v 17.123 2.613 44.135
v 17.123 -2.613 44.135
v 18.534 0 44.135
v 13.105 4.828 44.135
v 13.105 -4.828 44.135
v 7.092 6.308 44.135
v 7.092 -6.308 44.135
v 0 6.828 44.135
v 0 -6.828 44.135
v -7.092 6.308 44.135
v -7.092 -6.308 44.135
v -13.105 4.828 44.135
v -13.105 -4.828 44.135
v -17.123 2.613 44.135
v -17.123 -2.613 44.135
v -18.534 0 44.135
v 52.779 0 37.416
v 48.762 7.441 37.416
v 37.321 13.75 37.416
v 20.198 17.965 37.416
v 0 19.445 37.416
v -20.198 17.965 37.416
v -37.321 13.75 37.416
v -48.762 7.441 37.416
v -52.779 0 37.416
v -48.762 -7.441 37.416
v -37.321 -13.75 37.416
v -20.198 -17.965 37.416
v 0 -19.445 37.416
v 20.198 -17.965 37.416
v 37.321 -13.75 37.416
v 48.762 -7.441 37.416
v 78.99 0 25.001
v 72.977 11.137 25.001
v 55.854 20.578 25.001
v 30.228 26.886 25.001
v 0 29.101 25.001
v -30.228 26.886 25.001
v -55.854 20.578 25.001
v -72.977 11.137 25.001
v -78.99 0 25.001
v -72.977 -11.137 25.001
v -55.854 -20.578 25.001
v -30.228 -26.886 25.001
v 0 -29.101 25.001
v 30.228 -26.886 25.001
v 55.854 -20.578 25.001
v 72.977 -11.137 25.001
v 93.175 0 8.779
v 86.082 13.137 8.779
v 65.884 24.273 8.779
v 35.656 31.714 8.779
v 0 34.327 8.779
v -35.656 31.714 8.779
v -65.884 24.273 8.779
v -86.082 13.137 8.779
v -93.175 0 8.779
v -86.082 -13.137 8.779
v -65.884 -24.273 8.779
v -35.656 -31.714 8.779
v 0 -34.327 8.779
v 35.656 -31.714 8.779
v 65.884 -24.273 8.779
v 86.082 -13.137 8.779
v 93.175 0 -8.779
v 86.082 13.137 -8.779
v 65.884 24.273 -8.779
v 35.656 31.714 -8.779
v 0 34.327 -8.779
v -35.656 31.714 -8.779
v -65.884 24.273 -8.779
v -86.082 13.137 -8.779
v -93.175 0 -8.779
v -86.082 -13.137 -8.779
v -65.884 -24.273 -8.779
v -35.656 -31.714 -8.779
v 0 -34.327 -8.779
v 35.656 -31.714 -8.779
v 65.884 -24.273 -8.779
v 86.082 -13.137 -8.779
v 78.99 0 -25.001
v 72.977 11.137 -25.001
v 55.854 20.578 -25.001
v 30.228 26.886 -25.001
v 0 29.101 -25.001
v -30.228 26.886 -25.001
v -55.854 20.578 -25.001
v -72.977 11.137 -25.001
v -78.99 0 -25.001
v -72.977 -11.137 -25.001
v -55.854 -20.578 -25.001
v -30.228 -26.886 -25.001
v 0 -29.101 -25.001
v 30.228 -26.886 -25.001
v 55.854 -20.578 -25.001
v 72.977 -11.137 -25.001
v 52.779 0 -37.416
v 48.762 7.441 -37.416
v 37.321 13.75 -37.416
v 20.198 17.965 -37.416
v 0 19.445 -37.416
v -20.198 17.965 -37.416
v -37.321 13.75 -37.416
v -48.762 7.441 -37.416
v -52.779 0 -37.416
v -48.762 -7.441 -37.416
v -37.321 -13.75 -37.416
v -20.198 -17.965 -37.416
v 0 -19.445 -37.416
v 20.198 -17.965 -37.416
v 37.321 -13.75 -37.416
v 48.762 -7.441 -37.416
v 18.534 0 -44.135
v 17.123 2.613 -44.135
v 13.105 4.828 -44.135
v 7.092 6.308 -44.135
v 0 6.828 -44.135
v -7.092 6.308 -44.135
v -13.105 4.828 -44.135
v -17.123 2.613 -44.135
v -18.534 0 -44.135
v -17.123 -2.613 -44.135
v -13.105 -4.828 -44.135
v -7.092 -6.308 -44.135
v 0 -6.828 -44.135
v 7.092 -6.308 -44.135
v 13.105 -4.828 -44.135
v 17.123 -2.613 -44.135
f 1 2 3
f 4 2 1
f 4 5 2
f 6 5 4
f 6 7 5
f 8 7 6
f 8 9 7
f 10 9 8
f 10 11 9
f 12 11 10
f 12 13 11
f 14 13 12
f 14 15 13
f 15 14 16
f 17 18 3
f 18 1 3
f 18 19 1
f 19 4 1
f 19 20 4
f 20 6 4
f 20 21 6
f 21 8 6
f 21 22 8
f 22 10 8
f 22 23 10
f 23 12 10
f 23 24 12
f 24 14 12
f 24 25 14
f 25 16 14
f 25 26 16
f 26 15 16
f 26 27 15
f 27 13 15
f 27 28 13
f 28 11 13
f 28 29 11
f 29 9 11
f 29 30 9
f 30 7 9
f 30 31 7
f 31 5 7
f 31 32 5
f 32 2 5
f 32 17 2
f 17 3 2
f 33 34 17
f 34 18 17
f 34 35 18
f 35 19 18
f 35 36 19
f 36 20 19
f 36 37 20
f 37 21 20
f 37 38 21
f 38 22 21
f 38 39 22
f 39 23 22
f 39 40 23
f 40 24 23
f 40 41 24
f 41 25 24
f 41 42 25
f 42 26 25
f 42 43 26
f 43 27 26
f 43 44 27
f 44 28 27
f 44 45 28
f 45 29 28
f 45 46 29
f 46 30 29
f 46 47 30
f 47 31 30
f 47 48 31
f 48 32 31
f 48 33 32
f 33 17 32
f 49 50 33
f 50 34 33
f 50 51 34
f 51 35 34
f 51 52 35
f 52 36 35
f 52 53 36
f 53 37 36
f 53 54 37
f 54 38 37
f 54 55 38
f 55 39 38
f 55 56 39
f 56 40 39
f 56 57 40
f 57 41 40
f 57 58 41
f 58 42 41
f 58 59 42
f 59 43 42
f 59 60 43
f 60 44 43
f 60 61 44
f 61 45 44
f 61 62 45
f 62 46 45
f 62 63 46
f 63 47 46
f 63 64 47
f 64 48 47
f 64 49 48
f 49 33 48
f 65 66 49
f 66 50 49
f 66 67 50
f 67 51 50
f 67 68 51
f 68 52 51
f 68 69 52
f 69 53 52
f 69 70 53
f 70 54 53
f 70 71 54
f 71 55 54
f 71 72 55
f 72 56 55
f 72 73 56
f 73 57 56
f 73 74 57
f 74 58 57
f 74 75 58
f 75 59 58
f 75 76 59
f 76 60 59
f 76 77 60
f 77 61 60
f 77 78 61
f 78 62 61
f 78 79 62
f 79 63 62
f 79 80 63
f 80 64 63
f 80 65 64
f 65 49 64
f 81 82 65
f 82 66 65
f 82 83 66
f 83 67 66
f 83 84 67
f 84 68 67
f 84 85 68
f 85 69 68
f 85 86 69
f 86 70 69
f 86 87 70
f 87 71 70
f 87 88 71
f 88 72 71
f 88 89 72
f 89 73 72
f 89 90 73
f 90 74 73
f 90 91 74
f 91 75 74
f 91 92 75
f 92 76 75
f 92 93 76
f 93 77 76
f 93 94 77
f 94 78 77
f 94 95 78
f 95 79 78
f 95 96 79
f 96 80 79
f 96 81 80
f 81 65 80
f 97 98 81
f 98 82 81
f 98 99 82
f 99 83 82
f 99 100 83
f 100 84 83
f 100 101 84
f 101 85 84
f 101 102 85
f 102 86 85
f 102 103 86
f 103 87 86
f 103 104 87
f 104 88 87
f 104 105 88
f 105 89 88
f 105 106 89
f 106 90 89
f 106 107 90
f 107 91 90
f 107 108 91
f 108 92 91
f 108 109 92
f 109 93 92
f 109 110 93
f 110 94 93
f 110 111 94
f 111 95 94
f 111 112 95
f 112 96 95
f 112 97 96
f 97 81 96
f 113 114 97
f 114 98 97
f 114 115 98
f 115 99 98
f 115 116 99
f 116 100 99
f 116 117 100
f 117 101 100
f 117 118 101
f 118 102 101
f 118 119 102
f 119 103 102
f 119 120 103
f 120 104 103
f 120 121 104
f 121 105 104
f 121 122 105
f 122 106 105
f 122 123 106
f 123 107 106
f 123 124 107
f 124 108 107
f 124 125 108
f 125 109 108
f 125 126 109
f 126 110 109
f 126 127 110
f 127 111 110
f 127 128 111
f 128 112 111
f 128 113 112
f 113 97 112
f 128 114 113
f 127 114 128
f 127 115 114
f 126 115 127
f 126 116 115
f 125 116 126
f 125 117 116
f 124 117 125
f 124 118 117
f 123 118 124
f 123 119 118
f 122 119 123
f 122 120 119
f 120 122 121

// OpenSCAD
// Generated by SolidPython 1.0.1 on 2020-07-29 00:46:53


scale(v = [19, 7, 9]) {
	sphere(r = 5);
}
/***********************************************
*********      SolidPython code:      **********
************************************************
 
# import packages: SolidPython
from solid import *
from solid.utils import *
from itertools import chain, combinations, permutations


class Resize:

    def __init__(self, scad_file):
        self.scad_file = scad_file
        #self.scad_file = import_scad(scad_file)
        # cone/cylinder param:
        self.r1 = 0
        self.r2 = 0
        self.h = 0
        # rectangular prism param:
        self.w = 0
        self.l = 0
        # ellipse param:
        self.r = 0

    # import OpenScad code (file name corresponds to shape)


    # classify shape + parameters
    def assign(self, param1, param2, param3):
        if self.scad_file == 'cone.scad':
            self.r1 = param1
            self.r2 = param2
            self.h = param3
        elif self.scad_file == 'cylinder.scad':
            self.r1 = param1
            self.r2 = param2
            self.h = param3
        elif self.scad_file == 'rectangularPrism.scad':
            self.h = param1
            self.l = param2
            self.w = param3
        else:
            self.r = param1
            self.h = param2

    # resize parameters
    def iterate(self):
        x = range(3, 20, 2)
        i = 1
        if self.scad_file == 'cone.scad':
            tempList = list(permutations(x, 2))
            for temp in tempList:
                param1 = temp[0]
                param2 = temp[1]
                filepath = 'produced_scad_files/' + 'cone' + str(param1) + '_' + str(param2) + '_' + '.scad'
                scad_render_to_file(cylinder(h=param1, r1=param2, r2=0), filepath)

        elif self.scad_file == 'cylinder.scad':
            tempList = list(permutations(x, 3))
            for temp in tempList:
                param1 = temp[0]
                param2 = temp[1]
                filepath = 'produced_scad_files/' + 'cylinder' + str(param1) + '_' + str(param2) + '_' + '.scad'
                scad_render_to_file(cylinder(h=param1, r1=param2, r2=param2), filepath)

        elif self.scad_file == 'rectangularPrism.scad':
            tempList = list(permutations(x, 3))
            for temp in tempList:
                param1 = temp[0]
                param2 = temp[1]
                param3 = temp[2]
                filepath = 'produced_scad_files/' + 'rectangularPrism' + str(param1) + '_' + str(param2) + '_' + str(
                    param3) + '.scad'
                scad_render_to_file(cube(size=(param1, param2, param3)), filepath)

        elif self.scad_file == 'ellipse.scad':
            tempList = list(permutations(x, 4))
            for temp in tempList:
                param1 = temp[0]
                param2 = temp[1]
                param3 = temp[2]
                param4 = temp[3]
                filepath = 'produced_scad_files/' + 'ellipse' + str(param1) + '_' + str(param2) + '_' + str(param3) + '_' + str(param4) + '.scad'
                scad_render_to_file(scale([param1, param2, param3])(sphere(r=param4)), filepath)

    def render_to_scadfile(self):
        scad_render_to_file(scad, 'example.scad') 
 
************************************************/
